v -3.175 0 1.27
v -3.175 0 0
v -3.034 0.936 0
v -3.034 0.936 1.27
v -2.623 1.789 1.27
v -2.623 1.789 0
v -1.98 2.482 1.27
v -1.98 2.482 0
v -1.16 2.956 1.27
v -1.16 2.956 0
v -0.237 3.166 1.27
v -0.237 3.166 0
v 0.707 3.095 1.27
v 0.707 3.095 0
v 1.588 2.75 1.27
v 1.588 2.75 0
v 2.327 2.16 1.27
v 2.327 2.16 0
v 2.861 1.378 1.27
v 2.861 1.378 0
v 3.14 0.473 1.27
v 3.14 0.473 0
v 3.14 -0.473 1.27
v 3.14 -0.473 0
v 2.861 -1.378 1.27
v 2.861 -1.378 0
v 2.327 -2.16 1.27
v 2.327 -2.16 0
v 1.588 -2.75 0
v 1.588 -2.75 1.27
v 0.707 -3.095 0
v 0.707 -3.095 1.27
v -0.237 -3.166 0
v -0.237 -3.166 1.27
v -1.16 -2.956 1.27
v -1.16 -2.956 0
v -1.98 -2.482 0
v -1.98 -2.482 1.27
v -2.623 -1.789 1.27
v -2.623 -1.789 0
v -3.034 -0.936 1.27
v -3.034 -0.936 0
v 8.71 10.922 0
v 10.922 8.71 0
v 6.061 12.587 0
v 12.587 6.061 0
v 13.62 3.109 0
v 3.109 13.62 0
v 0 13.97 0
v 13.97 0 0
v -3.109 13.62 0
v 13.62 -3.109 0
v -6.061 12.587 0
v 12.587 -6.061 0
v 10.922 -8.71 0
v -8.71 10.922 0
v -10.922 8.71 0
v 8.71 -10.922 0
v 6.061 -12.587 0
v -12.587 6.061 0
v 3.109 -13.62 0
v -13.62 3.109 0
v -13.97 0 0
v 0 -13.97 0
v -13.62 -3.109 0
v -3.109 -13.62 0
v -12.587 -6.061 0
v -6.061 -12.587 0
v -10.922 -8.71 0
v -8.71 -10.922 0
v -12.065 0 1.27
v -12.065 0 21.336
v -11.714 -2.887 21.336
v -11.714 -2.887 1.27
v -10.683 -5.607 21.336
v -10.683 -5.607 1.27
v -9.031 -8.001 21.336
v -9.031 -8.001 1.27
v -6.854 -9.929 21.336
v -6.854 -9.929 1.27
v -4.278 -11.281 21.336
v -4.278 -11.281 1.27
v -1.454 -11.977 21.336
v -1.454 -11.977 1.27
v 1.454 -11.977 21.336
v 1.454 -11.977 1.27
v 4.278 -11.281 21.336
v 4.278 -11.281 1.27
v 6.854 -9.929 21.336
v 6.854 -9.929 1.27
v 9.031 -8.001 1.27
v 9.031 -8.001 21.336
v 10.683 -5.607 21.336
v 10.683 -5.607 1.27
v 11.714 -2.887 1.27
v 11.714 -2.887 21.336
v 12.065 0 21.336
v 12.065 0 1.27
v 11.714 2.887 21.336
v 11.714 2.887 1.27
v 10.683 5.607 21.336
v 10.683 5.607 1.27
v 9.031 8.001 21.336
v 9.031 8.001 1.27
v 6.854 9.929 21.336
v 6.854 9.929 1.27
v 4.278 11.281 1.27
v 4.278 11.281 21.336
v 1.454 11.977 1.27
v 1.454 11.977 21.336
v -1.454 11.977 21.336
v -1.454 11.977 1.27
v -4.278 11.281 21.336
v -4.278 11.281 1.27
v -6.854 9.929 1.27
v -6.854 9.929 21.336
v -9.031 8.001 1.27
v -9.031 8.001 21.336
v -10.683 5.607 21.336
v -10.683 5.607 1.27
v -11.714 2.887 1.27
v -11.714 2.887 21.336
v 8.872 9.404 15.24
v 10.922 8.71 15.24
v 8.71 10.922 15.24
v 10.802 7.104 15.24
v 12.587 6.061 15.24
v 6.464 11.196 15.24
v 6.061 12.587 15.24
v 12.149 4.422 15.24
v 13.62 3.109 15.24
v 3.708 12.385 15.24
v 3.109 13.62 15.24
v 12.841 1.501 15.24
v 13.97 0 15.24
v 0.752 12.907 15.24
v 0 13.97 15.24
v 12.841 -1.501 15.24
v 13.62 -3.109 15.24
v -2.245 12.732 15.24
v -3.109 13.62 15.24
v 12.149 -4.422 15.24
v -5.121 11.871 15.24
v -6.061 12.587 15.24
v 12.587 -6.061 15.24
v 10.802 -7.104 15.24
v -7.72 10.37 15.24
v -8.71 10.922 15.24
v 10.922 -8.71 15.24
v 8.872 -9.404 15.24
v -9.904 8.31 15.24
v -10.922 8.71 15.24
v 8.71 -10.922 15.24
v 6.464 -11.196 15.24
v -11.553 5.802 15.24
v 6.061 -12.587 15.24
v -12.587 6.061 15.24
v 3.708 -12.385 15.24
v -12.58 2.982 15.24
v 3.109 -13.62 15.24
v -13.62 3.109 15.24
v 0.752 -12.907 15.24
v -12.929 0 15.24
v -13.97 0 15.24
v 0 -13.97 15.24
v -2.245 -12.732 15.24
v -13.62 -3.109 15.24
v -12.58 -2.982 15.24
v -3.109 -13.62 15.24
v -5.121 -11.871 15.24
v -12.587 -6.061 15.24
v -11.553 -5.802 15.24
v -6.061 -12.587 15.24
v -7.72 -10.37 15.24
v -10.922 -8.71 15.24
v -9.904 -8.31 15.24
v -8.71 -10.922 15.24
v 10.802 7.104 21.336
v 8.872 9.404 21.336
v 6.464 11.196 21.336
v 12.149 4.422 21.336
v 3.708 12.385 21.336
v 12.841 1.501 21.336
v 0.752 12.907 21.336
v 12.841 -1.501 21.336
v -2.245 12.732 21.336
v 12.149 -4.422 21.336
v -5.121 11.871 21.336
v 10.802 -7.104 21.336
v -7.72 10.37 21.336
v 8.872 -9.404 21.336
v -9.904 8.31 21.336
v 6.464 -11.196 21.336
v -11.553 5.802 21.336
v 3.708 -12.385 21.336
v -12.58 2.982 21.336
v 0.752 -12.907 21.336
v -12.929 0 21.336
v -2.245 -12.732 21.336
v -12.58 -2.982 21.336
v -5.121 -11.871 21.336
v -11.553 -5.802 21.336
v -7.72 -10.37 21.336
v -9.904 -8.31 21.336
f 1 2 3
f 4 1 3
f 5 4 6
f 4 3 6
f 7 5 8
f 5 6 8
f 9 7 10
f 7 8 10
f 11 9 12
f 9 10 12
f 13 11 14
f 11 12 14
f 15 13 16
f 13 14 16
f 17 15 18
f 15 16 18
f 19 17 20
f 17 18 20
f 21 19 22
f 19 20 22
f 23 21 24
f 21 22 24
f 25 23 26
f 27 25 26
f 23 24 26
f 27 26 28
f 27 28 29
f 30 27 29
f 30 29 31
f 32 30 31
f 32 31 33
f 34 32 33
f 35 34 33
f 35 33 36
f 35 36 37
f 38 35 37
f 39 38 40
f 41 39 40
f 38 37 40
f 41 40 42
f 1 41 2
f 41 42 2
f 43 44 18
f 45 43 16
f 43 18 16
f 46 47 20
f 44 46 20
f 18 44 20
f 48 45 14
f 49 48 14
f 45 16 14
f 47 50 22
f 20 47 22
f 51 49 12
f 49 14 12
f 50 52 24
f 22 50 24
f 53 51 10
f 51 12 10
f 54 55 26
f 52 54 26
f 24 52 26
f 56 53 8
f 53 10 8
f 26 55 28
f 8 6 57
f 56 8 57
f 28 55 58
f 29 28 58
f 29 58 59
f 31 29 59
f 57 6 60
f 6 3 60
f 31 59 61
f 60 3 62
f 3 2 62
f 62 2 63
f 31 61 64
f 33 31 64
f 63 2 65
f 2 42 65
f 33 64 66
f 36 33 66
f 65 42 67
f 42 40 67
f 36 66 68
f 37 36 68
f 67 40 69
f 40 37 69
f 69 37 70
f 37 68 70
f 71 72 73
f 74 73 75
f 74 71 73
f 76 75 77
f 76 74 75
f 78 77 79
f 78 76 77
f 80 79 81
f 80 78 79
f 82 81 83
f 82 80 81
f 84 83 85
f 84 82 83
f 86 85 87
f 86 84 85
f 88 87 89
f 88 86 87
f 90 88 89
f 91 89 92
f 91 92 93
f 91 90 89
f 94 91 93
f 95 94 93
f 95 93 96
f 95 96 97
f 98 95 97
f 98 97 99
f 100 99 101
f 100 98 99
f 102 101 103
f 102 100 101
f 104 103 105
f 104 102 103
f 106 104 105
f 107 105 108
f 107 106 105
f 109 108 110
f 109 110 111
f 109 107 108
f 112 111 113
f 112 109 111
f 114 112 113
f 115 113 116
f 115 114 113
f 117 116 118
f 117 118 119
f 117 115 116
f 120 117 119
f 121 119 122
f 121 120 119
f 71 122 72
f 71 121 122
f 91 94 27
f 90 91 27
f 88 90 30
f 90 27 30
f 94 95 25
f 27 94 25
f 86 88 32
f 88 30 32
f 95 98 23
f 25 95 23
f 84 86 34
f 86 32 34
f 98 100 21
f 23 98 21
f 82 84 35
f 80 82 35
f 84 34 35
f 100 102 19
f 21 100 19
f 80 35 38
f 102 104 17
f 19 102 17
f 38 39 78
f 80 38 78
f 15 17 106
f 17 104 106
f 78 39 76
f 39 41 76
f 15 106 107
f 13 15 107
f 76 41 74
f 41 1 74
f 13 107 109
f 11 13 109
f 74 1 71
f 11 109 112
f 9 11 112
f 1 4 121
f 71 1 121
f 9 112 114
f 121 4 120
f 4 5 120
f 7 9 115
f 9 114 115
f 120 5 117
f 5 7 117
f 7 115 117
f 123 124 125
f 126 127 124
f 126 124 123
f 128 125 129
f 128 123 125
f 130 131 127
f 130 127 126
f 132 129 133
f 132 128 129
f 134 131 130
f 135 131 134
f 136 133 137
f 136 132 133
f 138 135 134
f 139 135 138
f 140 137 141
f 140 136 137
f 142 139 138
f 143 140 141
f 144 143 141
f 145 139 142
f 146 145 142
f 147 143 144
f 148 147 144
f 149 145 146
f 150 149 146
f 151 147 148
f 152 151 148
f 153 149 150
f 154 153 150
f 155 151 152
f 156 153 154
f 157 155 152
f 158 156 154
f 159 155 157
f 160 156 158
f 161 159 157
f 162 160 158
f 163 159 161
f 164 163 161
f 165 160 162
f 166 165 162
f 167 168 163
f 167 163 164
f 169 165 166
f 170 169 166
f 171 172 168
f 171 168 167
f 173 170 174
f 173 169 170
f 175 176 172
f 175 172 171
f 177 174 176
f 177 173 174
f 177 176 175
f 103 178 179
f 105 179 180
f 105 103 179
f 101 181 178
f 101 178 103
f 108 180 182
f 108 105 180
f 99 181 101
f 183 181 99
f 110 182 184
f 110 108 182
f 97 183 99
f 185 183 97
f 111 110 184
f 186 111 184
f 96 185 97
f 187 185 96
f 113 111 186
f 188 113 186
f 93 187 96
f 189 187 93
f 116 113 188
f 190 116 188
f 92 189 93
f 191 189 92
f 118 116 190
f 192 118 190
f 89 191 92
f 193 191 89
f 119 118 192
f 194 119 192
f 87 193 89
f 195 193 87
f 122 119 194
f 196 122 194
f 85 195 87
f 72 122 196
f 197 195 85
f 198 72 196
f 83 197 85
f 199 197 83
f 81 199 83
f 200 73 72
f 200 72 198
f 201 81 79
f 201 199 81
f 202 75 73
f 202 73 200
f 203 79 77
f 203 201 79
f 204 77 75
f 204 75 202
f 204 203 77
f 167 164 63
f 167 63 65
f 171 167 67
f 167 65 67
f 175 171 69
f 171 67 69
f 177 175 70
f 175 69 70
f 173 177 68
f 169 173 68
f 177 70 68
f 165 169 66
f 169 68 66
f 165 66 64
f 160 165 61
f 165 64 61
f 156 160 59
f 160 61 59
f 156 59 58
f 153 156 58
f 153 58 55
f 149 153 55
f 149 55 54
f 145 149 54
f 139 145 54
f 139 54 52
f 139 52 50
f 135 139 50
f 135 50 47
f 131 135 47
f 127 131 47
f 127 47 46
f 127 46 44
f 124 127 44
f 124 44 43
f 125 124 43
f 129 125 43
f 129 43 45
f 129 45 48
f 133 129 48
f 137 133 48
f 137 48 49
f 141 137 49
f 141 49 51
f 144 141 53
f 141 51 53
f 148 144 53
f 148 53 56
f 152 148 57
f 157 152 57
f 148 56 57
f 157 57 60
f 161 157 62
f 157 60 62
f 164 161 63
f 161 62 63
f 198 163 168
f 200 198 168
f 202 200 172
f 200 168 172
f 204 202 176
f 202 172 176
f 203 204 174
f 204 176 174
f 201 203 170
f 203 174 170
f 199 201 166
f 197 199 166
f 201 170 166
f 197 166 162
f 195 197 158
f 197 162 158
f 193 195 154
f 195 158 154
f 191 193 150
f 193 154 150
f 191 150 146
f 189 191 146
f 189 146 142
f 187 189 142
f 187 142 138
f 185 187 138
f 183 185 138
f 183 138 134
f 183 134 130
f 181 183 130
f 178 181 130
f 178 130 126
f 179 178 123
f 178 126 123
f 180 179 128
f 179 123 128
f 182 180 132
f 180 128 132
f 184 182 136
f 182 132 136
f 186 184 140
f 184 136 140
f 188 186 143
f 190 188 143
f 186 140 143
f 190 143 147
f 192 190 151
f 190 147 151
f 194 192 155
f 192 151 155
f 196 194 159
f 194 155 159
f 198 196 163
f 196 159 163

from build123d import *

# Parameters (mm, degrees)
SKETCH1_R           = 13.97
SKETCH1_R_2         = 12.065
BOSS_EXTRUDE1_DEPTH = 15.24
SKETCH2_R           = 13.97
SKETCH2_R_2         = 3.175
BOSS_EXTRUDE2_DEPTH = 1.27
SKETCH3_R           = 12.9286
SKETCH3_R_2         = 12.065
BOSS_EXTRUDE3_DEPTH = 6.096


with BuildPart() as part:
    # Sketch1 → Boss-Extrude1 (new body)
    with BuildSketch(Plane.XY):
        with Locations(Location((0, 0, 0), (0, 0, 180))):
            Circle(SKETCH1_R)
        with Locations(Location((0, 0, 0), (0, 0, 180))):
            Circle(SKETCH1_R_2, mode=Mode.SUBTRACT)
    extrude(amount=BOSS_EXTRUDE1_DEPTH)

    # Sketch2 → Boss-Extrude2 (add)
    with BuildSketch(Plane(origin=(0, 0, 0), x_dir=(-1, 0, 0), z_dir=(0, 0, -1))):
        Circle(SKETCH2_R)
        Circle(SKETCH2_R_2, mode=Mode.SUBTRACT)
    extrude(amount=-BOSS_EXTRUDE2_DEPTH)

    # Sketch3 → Boss-Extrude3 (add)
    with BuildSketch(Plane.XY.offset(15.24)):
        with Locations(Location((0, 0, 0), (0, 0, 180))):
            Circle(SKETCH3_R)
        with Locations(Location((0, 0, 0), (0, 0, 180))):
            Circle(SKETCH3_R_2, mode=Mode.SUBTRACT)
    extrude(amount=BOSS_EXTRUDE3_DEPTH)


solid = part.part
